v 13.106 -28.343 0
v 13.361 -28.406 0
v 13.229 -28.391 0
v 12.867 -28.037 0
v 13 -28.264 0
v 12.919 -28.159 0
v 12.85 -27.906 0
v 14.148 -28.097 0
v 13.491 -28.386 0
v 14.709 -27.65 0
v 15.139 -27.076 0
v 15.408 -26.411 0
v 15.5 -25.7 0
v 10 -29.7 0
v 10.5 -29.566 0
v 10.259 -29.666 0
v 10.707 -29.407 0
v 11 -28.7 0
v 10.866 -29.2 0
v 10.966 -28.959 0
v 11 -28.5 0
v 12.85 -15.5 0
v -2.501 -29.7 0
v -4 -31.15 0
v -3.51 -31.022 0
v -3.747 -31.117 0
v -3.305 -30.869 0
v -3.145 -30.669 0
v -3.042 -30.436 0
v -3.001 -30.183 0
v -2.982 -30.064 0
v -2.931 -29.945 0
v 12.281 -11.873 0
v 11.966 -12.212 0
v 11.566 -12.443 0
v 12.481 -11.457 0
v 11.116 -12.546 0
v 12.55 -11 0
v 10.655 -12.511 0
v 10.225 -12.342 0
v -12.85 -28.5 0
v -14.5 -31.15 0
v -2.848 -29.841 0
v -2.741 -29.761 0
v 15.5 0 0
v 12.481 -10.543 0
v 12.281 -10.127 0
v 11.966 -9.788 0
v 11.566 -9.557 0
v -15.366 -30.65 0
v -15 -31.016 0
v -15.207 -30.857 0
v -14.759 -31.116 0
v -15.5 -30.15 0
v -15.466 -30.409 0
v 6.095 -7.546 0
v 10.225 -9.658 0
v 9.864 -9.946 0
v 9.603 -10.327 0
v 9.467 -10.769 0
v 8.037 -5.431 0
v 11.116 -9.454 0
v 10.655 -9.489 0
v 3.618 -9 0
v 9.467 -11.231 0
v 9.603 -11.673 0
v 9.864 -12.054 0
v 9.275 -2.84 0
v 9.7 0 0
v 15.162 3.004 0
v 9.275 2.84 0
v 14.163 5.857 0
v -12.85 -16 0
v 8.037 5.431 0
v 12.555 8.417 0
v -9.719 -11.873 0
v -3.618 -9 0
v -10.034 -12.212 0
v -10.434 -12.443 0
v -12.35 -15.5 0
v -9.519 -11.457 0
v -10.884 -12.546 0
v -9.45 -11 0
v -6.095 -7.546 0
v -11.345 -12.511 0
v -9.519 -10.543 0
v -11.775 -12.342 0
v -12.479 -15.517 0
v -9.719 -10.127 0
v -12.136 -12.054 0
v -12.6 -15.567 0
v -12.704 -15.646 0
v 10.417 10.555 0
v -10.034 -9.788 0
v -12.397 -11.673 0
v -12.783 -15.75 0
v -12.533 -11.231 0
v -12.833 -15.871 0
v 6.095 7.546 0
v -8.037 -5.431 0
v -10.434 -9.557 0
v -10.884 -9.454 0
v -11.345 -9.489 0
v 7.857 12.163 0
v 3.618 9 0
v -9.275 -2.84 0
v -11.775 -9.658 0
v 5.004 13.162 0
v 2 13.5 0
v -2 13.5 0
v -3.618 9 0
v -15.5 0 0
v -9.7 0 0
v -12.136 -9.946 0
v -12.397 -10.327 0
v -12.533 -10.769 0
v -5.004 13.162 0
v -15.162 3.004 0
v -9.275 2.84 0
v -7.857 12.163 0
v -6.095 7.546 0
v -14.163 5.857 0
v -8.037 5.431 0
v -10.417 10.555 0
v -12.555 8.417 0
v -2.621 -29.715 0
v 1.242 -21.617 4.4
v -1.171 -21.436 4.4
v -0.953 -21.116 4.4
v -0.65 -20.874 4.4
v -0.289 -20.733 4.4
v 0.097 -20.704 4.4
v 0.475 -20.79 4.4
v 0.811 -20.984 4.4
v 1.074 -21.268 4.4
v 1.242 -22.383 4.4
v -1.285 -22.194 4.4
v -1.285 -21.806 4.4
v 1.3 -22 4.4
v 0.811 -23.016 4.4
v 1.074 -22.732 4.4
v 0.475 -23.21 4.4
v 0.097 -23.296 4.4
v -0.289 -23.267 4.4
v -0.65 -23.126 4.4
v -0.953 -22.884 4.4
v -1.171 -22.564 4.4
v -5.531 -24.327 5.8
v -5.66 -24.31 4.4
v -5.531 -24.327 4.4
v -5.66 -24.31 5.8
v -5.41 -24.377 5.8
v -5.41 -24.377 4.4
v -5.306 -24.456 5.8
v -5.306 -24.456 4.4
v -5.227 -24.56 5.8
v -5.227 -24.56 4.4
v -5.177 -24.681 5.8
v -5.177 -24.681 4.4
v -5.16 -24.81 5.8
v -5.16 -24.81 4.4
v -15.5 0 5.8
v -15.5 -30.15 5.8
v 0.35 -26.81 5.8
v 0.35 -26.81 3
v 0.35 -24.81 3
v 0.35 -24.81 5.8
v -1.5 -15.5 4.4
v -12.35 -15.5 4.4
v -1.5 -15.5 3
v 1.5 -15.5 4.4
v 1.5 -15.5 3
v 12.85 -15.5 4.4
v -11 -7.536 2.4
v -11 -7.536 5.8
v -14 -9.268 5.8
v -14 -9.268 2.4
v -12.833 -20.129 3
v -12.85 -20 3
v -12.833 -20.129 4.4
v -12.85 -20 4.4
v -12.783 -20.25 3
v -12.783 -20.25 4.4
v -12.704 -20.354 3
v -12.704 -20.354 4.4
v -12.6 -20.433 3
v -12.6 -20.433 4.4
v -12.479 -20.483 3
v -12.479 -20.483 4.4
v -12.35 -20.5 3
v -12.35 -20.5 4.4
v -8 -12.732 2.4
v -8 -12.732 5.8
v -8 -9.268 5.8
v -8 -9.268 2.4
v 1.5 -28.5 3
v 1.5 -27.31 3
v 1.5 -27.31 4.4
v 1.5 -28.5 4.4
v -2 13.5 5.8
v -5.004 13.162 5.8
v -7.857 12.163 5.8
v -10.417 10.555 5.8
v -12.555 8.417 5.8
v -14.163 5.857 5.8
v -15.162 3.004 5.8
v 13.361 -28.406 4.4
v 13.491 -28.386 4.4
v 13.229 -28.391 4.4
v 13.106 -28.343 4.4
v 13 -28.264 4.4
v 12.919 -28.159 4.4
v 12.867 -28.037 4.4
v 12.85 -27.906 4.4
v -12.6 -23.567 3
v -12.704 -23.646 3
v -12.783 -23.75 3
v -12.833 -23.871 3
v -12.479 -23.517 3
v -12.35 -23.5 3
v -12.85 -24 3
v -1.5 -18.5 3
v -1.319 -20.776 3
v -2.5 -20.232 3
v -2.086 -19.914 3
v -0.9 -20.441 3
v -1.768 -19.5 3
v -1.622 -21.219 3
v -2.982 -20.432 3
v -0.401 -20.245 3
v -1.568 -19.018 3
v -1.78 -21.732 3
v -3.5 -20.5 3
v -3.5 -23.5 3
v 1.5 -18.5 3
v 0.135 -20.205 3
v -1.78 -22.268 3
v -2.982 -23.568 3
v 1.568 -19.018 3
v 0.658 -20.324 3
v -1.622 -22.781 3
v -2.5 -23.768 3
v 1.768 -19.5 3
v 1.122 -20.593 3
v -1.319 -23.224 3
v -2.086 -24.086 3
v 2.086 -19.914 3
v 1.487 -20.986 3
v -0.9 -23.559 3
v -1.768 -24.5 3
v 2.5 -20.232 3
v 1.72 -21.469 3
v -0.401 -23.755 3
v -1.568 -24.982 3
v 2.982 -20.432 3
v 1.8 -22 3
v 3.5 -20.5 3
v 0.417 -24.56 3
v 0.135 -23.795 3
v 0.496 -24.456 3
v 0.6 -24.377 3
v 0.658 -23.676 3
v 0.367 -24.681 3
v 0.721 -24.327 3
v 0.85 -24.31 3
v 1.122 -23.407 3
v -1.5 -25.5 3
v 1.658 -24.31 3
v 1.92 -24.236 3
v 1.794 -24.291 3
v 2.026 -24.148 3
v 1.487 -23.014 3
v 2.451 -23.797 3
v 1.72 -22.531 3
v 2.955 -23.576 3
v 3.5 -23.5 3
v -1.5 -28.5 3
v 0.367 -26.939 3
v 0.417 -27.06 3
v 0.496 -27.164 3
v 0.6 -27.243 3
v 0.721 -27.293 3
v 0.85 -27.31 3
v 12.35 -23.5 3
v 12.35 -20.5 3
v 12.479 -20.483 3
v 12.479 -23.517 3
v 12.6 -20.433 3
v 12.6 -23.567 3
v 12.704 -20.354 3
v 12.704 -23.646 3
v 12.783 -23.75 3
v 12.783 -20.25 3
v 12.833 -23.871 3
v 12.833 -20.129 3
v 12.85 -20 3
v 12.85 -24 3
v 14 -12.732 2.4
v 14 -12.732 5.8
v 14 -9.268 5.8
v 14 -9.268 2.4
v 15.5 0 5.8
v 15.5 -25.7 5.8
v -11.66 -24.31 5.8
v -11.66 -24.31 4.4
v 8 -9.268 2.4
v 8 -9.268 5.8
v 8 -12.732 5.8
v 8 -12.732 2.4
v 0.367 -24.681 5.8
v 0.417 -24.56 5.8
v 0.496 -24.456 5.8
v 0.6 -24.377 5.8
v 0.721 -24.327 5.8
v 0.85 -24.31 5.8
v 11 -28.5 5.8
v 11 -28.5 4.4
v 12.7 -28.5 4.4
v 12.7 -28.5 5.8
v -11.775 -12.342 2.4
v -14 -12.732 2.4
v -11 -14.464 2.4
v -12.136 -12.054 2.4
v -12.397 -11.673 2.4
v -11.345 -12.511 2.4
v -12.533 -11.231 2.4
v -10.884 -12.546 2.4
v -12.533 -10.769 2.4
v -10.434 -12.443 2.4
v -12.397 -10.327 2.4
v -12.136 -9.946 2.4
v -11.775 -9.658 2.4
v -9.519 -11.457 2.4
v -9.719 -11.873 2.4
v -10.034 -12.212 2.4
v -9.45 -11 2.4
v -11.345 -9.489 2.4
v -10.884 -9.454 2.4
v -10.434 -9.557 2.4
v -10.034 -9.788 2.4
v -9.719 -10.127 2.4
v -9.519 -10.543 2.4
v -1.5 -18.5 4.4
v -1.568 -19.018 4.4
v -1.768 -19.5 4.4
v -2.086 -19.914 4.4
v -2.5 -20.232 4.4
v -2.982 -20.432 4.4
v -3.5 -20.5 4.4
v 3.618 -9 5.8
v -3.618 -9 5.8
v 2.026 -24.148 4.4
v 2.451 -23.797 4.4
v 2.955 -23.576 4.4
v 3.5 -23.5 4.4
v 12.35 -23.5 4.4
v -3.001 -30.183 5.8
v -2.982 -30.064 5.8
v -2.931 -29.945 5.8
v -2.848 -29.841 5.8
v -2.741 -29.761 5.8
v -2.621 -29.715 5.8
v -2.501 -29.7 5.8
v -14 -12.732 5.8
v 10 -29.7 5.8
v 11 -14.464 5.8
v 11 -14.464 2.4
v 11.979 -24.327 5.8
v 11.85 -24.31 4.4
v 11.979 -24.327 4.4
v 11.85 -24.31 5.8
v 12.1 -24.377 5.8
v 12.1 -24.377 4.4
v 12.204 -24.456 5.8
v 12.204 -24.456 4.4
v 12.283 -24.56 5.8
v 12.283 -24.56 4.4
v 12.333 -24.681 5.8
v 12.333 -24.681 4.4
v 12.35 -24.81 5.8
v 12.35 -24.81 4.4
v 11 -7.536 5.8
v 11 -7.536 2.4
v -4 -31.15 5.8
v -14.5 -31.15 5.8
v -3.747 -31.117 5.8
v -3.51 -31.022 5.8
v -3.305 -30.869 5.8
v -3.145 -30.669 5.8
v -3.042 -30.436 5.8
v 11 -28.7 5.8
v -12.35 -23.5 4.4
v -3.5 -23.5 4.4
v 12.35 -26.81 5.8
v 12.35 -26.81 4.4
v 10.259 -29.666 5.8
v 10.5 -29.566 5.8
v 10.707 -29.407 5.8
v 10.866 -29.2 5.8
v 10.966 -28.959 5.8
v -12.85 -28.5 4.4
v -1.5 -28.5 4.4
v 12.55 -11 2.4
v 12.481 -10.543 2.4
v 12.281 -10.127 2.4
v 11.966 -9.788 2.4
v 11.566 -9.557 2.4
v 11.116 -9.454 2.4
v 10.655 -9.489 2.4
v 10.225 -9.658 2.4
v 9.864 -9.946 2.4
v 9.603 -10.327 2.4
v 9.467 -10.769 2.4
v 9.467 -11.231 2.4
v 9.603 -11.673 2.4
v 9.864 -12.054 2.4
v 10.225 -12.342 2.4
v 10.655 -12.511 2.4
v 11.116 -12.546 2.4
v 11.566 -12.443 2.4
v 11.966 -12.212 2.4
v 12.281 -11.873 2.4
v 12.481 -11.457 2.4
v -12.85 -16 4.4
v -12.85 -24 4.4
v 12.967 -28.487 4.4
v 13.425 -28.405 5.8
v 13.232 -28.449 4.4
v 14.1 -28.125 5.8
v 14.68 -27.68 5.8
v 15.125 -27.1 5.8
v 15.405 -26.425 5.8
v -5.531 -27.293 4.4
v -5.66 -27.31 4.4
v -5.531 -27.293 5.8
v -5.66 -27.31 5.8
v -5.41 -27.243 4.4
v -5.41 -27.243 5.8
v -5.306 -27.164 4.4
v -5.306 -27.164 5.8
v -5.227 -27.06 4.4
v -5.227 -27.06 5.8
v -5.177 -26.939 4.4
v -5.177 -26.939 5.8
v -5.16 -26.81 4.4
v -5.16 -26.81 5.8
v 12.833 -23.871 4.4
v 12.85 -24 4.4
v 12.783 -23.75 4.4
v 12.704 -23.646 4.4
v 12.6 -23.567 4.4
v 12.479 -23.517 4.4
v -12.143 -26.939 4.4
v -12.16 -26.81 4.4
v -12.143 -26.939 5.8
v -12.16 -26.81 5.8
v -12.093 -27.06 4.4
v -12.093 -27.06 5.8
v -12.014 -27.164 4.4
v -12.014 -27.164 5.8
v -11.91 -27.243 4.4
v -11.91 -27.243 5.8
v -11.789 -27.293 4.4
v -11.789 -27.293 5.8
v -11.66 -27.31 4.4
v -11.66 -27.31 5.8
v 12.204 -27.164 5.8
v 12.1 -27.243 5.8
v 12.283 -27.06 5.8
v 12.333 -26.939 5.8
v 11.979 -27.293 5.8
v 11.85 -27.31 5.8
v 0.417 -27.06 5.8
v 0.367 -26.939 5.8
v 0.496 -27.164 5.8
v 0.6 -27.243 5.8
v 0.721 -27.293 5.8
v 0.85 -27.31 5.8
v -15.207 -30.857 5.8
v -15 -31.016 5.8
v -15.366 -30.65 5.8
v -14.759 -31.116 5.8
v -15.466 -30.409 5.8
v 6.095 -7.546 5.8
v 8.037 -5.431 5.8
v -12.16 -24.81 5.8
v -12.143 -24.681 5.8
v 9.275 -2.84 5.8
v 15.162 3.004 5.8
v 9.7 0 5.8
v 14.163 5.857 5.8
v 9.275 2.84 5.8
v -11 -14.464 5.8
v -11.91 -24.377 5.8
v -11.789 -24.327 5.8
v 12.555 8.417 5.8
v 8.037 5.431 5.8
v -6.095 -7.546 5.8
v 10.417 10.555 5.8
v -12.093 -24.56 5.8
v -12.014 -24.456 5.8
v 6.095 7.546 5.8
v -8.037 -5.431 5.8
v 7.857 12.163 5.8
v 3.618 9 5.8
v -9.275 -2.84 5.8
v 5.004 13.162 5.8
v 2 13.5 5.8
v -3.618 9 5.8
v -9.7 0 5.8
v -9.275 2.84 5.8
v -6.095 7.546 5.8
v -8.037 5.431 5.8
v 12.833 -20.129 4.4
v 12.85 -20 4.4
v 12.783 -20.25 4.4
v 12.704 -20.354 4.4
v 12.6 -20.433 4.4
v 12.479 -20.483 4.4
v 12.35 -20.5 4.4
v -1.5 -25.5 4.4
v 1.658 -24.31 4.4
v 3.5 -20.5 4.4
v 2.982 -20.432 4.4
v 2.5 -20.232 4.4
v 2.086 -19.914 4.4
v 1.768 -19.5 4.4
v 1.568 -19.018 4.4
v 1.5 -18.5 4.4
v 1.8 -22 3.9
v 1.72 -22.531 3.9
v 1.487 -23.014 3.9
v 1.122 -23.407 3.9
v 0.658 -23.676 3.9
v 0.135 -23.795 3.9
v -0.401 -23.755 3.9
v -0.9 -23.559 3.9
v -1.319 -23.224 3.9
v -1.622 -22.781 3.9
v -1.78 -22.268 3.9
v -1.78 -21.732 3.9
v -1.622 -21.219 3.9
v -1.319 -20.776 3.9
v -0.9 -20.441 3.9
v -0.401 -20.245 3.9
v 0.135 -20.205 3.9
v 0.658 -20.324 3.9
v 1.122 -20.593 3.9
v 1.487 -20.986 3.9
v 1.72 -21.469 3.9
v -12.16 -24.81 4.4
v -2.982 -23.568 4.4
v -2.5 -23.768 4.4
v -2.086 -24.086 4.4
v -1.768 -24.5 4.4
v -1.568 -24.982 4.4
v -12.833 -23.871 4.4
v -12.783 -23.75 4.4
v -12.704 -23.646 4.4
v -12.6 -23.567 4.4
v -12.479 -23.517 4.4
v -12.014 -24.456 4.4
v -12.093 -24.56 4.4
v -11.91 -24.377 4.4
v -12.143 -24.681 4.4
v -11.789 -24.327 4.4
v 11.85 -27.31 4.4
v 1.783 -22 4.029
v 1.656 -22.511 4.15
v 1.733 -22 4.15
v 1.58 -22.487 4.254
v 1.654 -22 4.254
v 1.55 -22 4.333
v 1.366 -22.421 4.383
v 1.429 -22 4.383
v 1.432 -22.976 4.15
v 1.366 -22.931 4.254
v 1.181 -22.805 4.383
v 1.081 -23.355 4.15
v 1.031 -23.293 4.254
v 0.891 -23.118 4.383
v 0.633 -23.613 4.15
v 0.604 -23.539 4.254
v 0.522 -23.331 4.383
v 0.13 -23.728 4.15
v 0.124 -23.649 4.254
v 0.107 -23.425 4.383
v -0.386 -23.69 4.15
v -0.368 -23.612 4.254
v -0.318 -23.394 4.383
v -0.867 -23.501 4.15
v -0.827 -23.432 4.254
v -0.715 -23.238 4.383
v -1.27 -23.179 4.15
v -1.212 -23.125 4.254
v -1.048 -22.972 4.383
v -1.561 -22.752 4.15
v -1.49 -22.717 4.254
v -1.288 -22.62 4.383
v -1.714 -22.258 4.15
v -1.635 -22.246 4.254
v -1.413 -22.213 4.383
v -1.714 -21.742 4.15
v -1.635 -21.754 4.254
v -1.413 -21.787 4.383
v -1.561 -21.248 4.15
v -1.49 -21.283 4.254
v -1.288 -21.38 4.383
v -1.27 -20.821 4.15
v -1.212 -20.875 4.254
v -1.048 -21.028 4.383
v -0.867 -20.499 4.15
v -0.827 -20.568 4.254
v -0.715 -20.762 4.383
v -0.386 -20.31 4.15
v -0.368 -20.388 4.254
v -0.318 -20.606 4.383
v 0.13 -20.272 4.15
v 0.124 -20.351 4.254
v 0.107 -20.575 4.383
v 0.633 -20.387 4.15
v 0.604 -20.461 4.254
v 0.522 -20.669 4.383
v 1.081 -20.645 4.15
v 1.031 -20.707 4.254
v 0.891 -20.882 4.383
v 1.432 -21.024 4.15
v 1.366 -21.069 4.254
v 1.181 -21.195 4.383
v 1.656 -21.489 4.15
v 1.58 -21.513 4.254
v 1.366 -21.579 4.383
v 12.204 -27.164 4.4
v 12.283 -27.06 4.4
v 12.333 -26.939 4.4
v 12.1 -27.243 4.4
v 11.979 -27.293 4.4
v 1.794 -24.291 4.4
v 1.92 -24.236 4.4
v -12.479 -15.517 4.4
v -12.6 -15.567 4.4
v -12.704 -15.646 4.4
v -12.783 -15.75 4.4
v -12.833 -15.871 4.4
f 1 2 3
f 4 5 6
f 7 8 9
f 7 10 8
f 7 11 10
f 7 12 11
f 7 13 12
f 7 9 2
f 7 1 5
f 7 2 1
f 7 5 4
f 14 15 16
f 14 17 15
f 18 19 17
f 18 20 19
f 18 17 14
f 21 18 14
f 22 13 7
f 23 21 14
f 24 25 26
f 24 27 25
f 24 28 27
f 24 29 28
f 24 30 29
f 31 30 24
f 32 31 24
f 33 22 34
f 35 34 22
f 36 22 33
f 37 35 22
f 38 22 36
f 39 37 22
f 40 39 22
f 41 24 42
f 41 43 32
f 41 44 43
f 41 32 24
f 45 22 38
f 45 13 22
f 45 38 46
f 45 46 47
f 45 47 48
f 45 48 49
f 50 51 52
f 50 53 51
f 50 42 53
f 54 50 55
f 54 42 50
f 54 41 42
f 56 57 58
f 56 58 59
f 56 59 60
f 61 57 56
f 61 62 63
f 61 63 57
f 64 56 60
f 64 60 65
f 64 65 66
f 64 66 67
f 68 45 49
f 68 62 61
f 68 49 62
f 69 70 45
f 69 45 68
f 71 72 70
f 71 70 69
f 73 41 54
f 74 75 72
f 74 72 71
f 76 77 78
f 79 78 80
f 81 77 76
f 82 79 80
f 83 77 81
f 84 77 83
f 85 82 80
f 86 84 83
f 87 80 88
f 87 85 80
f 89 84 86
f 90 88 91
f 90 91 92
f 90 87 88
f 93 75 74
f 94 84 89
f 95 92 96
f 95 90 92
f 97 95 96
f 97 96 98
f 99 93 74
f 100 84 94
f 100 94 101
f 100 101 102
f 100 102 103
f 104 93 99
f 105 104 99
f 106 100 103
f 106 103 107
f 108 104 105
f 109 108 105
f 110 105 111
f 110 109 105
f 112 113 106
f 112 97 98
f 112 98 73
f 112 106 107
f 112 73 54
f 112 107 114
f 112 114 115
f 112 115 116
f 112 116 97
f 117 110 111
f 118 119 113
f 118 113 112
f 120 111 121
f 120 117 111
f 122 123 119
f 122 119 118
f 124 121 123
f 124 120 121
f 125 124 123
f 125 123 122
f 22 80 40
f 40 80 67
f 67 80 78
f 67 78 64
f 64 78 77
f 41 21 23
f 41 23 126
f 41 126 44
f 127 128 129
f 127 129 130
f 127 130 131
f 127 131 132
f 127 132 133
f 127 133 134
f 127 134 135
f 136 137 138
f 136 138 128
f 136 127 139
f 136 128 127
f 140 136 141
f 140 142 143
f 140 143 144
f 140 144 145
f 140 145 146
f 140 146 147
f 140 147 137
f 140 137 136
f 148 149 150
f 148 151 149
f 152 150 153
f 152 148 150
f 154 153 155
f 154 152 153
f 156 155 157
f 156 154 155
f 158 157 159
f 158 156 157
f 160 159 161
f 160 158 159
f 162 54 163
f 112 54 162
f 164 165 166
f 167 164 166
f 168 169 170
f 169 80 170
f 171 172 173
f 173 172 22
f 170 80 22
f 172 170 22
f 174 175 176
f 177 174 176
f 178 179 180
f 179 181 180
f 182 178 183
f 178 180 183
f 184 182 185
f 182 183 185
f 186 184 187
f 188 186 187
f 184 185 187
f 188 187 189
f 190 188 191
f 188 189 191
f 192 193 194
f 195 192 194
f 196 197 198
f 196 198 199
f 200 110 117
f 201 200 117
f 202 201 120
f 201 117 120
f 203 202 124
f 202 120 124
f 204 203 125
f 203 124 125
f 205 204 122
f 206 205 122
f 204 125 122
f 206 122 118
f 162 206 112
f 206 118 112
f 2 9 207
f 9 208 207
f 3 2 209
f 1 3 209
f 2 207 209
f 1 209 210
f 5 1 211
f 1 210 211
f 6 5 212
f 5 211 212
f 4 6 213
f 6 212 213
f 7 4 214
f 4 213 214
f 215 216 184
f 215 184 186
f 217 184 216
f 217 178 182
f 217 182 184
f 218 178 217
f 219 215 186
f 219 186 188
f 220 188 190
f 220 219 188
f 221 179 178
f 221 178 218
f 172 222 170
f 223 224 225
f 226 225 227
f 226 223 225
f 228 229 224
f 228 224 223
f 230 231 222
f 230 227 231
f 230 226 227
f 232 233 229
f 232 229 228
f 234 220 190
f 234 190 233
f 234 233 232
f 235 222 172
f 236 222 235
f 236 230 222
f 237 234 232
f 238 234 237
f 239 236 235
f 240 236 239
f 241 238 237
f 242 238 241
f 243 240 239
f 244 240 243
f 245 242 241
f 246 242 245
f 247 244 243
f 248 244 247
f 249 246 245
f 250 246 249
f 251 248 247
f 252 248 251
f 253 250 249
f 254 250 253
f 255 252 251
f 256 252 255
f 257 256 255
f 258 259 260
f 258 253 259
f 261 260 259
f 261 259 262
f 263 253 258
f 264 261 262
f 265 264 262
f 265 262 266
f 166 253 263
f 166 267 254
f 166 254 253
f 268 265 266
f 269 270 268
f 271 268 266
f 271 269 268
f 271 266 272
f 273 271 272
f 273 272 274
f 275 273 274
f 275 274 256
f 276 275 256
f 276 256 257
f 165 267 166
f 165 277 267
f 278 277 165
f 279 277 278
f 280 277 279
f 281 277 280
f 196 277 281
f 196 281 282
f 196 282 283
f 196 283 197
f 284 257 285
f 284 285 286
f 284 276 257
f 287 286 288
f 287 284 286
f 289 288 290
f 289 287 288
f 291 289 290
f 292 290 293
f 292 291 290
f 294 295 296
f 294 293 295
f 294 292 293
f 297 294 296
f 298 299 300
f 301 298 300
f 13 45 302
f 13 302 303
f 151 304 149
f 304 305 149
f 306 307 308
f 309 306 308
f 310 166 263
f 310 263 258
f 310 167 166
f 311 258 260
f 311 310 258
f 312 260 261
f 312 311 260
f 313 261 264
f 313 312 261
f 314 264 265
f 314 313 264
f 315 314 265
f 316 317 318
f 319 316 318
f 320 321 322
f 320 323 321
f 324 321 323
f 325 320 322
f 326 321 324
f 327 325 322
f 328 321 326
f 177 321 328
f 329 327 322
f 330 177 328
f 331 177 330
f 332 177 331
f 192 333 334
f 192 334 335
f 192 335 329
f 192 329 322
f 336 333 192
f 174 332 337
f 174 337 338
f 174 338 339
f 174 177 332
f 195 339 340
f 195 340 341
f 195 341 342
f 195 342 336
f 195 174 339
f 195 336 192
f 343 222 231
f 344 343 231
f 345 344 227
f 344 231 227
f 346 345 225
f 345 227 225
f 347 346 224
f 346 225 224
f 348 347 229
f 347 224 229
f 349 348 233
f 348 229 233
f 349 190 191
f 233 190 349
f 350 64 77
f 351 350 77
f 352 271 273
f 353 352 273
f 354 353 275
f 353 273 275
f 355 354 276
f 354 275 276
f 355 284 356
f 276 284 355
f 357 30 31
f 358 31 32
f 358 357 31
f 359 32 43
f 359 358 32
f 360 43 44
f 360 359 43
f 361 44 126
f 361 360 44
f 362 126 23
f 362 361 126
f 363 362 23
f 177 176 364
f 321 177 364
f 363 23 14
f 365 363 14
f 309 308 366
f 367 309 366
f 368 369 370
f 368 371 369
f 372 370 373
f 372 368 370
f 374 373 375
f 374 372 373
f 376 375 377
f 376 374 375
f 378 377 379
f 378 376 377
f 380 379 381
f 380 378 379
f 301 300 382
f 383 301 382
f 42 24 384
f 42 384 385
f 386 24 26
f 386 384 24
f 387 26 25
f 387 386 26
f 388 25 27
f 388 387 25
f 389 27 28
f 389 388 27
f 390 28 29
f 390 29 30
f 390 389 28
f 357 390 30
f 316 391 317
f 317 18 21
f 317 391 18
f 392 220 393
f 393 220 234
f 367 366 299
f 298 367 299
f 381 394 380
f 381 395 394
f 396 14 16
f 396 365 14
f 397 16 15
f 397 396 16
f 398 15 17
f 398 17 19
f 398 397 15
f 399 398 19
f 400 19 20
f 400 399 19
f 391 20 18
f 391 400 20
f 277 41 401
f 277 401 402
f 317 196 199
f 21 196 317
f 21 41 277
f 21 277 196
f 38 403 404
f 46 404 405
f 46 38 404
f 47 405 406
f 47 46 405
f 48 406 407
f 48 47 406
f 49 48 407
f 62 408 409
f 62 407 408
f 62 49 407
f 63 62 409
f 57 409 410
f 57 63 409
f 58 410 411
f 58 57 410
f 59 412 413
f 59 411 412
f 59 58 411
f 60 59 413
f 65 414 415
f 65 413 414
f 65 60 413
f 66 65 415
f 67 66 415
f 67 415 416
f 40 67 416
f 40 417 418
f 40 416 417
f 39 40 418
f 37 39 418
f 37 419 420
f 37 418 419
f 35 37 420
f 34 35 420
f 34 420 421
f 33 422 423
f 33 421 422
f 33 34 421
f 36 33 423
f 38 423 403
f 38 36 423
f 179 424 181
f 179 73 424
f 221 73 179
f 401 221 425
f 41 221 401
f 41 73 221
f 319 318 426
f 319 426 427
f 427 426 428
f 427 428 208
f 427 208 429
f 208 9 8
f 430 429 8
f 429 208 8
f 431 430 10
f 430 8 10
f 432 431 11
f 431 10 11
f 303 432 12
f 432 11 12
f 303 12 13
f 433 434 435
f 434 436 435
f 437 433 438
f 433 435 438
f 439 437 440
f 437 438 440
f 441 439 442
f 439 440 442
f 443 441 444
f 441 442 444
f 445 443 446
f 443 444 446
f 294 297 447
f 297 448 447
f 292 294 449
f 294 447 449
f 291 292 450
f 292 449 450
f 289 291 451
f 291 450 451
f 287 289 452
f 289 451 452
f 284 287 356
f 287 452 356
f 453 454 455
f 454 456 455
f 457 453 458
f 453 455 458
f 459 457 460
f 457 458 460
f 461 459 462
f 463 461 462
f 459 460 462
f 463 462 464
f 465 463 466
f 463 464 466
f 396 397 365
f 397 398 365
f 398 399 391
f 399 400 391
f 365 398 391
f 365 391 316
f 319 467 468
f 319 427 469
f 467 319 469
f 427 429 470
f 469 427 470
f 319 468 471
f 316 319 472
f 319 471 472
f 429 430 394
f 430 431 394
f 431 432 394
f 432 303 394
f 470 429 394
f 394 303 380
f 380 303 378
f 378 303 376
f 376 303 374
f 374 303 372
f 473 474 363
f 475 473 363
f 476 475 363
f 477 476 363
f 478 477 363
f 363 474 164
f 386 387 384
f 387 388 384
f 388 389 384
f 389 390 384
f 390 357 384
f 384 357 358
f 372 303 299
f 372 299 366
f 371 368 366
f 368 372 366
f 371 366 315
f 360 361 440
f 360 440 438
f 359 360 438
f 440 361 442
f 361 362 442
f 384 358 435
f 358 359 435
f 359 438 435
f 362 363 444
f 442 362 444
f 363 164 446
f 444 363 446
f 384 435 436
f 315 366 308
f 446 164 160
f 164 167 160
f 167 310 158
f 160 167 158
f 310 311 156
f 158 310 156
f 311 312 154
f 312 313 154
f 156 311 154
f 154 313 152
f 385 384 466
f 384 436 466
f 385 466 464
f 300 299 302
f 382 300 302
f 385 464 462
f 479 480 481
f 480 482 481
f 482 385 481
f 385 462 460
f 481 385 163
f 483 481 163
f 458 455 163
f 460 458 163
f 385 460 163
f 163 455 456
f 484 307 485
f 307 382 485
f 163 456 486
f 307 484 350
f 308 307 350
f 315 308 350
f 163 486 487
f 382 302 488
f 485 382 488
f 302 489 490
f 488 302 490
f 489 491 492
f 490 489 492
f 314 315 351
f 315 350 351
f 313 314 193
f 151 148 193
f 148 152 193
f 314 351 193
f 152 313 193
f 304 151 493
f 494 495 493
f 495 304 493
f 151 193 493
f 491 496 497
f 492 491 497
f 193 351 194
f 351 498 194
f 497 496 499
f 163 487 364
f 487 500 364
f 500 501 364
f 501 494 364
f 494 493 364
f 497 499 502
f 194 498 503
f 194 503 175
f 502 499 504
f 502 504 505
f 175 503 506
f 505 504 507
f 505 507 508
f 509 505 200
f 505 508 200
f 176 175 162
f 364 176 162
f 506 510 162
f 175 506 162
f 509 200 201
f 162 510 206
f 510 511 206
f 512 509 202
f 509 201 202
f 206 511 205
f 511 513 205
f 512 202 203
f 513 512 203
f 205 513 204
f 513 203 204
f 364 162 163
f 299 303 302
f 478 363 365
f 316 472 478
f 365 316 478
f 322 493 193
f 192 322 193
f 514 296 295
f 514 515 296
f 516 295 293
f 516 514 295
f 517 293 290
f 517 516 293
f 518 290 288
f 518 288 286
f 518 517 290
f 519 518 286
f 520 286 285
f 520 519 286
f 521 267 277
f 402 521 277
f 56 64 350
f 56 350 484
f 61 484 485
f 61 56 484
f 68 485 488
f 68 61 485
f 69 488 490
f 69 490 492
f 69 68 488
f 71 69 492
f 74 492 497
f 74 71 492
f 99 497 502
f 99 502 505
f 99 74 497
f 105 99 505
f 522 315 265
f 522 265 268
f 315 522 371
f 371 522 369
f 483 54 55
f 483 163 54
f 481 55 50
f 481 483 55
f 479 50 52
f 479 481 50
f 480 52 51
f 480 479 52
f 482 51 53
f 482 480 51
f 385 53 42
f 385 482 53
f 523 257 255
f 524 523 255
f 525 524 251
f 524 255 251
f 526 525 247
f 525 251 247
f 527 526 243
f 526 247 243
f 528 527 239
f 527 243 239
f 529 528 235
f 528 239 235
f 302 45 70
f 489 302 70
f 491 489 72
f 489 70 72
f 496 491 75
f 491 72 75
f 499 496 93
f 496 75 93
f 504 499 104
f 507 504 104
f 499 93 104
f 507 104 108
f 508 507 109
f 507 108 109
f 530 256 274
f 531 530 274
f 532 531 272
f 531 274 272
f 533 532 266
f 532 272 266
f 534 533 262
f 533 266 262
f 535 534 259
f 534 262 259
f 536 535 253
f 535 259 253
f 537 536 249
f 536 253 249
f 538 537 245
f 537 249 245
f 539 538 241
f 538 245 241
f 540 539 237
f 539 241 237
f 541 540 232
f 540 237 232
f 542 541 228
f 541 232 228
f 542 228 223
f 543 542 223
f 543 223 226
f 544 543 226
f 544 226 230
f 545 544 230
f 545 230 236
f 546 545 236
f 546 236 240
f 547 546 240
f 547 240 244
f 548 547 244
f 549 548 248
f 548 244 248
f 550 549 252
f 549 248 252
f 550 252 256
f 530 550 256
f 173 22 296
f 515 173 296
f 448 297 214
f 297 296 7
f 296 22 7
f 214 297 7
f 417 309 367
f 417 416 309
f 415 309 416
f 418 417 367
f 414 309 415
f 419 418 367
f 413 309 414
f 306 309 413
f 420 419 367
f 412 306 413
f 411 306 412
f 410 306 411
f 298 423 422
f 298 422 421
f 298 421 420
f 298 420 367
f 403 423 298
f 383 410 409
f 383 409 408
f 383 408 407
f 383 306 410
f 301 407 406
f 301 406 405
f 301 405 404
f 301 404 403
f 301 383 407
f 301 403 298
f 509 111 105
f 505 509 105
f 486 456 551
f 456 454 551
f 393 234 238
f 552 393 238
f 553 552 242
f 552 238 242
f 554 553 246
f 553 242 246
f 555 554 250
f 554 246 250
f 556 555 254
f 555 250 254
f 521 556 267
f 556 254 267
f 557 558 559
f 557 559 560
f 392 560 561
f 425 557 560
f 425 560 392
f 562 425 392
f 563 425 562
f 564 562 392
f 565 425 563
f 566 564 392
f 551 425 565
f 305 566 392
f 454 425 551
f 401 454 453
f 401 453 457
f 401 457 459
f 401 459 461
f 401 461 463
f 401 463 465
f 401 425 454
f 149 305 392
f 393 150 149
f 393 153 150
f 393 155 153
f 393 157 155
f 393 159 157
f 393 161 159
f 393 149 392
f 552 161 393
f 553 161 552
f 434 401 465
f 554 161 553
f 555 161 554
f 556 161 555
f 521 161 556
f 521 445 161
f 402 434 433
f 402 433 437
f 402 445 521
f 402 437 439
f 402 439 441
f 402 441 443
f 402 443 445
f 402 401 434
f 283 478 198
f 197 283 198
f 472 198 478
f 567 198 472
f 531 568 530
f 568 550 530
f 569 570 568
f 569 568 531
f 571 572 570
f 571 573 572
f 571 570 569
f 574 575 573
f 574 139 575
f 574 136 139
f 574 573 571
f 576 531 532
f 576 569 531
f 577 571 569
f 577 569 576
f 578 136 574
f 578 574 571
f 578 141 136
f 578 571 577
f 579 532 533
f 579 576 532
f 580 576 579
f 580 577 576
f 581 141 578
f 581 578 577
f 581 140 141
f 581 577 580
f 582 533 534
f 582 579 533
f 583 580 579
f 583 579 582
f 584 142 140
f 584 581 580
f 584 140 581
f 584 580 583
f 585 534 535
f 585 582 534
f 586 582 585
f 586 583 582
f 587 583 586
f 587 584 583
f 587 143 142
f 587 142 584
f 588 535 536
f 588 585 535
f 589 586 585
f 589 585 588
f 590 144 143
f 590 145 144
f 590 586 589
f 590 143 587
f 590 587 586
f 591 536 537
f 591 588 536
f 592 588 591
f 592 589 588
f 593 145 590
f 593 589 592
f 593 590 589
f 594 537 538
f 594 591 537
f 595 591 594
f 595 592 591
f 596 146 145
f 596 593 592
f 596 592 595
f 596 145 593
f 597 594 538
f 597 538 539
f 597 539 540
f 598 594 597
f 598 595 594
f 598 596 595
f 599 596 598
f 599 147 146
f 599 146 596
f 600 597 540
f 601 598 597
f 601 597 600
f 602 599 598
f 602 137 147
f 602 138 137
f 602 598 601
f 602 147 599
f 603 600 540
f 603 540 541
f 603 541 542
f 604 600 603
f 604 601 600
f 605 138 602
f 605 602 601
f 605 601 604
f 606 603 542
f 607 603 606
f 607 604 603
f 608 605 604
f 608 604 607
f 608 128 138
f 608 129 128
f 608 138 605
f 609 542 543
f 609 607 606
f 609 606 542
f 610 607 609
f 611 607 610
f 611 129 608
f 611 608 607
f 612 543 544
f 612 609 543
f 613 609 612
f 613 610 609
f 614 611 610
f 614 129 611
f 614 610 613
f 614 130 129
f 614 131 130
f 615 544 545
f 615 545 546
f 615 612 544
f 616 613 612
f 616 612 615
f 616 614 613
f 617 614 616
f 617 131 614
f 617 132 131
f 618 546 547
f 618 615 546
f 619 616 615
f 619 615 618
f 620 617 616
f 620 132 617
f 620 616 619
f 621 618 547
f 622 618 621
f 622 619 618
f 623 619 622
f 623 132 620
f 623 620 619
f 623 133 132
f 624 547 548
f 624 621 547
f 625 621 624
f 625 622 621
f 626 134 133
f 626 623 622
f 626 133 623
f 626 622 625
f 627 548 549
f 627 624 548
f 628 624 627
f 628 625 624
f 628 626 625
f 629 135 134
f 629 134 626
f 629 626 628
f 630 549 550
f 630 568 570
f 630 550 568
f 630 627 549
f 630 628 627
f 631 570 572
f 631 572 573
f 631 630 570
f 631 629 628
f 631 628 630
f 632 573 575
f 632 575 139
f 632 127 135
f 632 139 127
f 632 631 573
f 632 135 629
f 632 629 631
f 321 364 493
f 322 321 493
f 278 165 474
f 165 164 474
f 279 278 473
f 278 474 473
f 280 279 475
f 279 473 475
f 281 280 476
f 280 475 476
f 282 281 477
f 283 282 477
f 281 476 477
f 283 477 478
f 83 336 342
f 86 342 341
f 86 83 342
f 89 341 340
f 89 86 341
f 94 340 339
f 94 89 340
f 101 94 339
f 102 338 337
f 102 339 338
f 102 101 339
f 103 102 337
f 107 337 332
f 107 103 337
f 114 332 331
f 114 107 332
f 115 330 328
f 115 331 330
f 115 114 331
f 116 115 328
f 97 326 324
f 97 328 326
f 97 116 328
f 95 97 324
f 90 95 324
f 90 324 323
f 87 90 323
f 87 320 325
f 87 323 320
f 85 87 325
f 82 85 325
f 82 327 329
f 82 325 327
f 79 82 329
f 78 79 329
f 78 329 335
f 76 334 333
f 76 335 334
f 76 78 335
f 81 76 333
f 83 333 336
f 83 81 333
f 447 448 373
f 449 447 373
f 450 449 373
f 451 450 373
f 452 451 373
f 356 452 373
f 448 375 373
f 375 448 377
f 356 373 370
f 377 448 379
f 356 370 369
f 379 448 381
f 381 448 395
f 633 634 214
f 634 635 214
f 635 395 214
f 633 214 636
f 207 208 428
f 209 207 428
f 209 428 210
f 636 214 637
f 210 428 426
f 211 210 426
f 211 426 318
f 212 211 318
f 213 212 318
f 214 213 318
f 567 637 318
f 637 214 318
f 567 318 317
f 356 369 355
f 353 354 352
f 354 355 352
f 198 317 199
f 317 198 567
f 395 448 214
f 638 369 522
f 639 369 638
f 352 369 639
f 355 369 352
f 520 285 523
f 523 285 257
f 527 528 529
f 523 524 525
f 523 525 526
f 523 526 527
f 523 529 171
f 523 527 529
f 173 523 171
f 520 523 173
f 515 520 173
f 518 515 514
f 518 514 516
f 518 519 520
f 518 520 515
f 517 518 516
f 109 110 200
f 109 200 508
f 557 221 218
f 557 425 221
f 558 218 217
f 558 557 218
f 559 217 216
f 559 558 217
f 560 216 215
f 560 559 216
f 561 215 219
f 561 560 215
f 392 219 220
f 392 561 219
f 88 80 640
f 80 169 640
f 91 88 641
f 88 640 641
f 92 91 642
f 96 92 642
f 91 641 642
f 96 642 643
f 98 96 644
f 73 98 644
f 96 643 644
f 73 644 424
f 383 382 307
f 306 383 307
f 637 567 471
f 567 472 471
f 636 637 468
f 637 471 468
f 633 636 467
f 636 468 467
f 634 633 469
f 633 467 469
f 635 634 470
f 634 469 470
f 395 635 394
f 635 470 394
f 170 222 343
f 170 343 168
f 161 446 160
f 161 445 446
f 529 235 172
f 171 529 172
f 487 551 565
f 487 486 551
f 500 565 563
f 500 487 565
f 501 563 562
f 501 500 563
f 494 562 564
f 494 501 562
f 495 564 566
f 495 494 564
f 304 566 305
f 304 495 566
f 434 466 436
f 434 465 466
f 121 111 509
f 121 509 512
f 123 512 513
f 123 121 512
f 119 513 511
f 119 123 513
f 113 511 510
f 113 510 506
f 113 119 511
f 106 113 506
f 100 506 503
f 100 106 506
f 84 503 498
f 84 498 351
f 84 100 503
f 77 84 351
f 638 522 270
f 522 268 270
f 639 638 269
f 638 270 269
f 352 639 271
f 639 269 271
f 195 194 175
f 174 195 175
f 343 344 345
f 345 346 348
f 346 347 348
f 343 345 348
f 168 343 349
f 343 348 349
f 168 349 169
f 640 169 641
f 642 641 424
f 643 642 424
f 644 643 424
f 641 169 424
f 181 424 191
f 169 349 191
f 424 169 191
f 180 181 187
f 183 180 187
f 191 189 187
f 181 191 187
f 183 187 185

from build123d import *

# Parameters (mm, degrees)
SKETCH_R        = 1.55
SKETCH_W        = 7
SKETCH_H        = 3
SKETCH_W_2      = 12
PAD_DEPTH       = 5.8
SKETCH005_W     = 25.7
SKETCH005_H     = 13
POCKET_DEPTH    = 3
SKETCH006_R     = 1.8
POCKET001_DEPTH = 1.4
POCKET002_DEPTH = 3.4
FILLET_R        = 1
FILLET001_R     = 0.5


with BuildPart() as part:
    # Sketch → Pad (new body)
    with BuildSketch(Plane.XY):
        with BuildLine():
            Line((-2, 13.5), (2, 13.5))
            ThreePointArc((15.5, 0), (11.545942, 9.545942), (2, 13.5))
            Line((15.5, 0), (15.5, -25.7))
            ThreePointArc((12.7, -28.5), (14.679899, -27.679899), (15.5, -25.7))
            Line((11, -28.5), (12.7, -28.5))
            Line((11, -29.7), (11, -28.5))
            Line((-3, -29.7), (11, -29.7))
            Line((-3, -31.15), (-3, -29.7))
            Line((-3, -31.15), (-15.5, -31.15))
            Line((-15.5, -31.15), (-15.5, 0))
            ThreePointArc((-2, 13.5), (-11.545942, 9.545942), (-15.5, 0))
        make_face()
        with Locations((-11, -11)):
            Circle(SKETCH_R, mode=Mode.SUBTRACT)
        with Locations((11, -11)):
            Circle(SKETCH_R, mode=Mode.SUBTRACT)
        with BuildLine():
            ThreePointArc((-3.618011, 9), (-9.7, 0), (-3.618011, -9))
            Line((3.618011, -9), (-3.618011, -9))
            ThreePointArc((3.618011, -9), (9.7, 0), (3.618011, 9))
            Line((-3.618011, 9), (3.618011, 9))
        make_face(mode=Mode.SUBTRACT)
        with Locations((-8.66, -25.81)):
            Rectangle(SKETCH_W, SKETCH_H, mode=Mode.SUBTRACT)
        with Locations((6.35, -25.81)):
            Rectangle(SKETCH_W_2, SKETCH_H, mode=Mode.SUBTRACT)
    extrude(amount=PAD_DEPTH)

    # Sketch005 (on Face26 of Pad) → Pocket (cut)
    with BuildSketch(Plane(origin=(0, 0, 0), x_dir=(1, 0, 0), z_dir=(0, 0, -1))):
        with Locations((0, 22)):
            Rectangle(SKETCH005_W, SKETCH005_H)
    extrude(amount=-POCKET_DEPTH, mode=Mode.SUBTRACT)

    # Sketch006 (on Face32 of Pocket) → Pocket001 (cut)
    with BuildSketch(Plane(origin=(0, 0, 3), x_dir=(1, 0, 0), z_dir=(0, 0, -1))):
        with Locations((0, 22)):
            Circle(SKETCH006_R)
        with BuildLine():
            Line((-12.85, 20.5), (-3.5, 20.5))
            ThreePointArc((-1.5, 18.5), (-2.085786, 19.914214), (-3.5, 20.5))
            Line((-1.5, 18.5), (-1.5, 15.5))
            Line((-1.5, 15.5), (-12.85, 15.5))
            Line((-12.85, 15.5), (-12.85, 20.5))
        make_face()
        with BuildLine():
            Line((1.5, 15.5), (12.85, 15.5))
            Line((12.85, 15.5), (12.85, 20.5))
            Line((12.85, 20.5), (3.5, 20.5))
            ThreePointArc((3.5, 20.5), (2.085786, 19.914214), (1.5, 18.5))
            Line((1.5, 18.5), (1.5, 15.5))
        make_face()
        with BuildLine():
            Line((-12.85, 23.5), (-3.5, 23.5))
            ThreePointArc((-3.5, 23.5), (-2.085786, 24.085786), (-1.5, 25.5))
            Line((-1.5, 25.5), (-1.5, 28.5))
            Line((-1.5, 28.5), (-12.85, 28.5))
            Line((-12.85, 28.5), (-12.85, 23.5))
        make_face()
        with BuildLine():
            Line((1.5, 28.5), (12.85, 28.5))
            Line((12.85, 28.5), (12.85, 23.5))
            Line((12.85, 23.5), (3.5, 23.5))
            ThreePointArc((1.5, 25.5), (2.085786, 24.085786), (3.5, 23.5))
            Line((1.5, 25.5), (1.5, 28.5))
        make_face()
    extrude(amount=-POCKET001_DEPTH, mode=Mode.SUBTRACT)

    # Sketch001 (on Face5 of Pocket001) → Pocket002 (cut)
    with BuildSketch(Plane.XY.offset(5.8)):
        Polygon((-8, -12.732051), (-8, -9.267949), (-11, -7.535898), (-14, -9.267949), (-14, -12.732051), (-11, -14.464102), align=None)
        Polygon((14, -12.732051), (14, -9.267949), (11, -7.535898), (8, -9.267949), (8, -12.732051), (11, -14.464102), align=None)
    extrude(amount=-POCKET002_DEPTH, mode=Mode.SUBTRACT)

    # Fillet
    fillet_edges = [part.edges().sort_by_distance(p)[0] for p in [
        (-15.5, -31.15, 2.9),
        (-3, -31.15, 2.9),
        (11, -29.7, 2.9),
    ]]
    fillet(fillet_edges, radius=FILLET_R)

    # Fillet001
    fillet001_edges = [part.edges().sort_by_distance(p)[0] for p in [
        (12.85, -23.5, 3.7),
        (12.85, -20.5, 3.7),
        (-12.85, -20.5, 3.7),
        (-12.85, -23.5, 3.7),
        (-1.8, -22, 4.4),
        (0.35, -27.31, 4.4),
        (0.35, -24.31, 4.4),
        (1.892549, -24.31, 3.7),
        (-3, -29.7, 2.9),
        (12.35, -27.31, 5.1),
        (12.35, -24.31, 5.1),
        (-5.16, -27.31, 5.1),
        (-5.16, -24.31, 5.1),
        (-12.16, -24.31, 5.1),
        (-12.16, -27.31, 5.1),
        (-12.85, -15.5, 1.5),
        (12.85, -28.495979, 1.5),
    ]]
    fillet(fillet001_edges, radius=FILLET001_R)


solid = part.part
